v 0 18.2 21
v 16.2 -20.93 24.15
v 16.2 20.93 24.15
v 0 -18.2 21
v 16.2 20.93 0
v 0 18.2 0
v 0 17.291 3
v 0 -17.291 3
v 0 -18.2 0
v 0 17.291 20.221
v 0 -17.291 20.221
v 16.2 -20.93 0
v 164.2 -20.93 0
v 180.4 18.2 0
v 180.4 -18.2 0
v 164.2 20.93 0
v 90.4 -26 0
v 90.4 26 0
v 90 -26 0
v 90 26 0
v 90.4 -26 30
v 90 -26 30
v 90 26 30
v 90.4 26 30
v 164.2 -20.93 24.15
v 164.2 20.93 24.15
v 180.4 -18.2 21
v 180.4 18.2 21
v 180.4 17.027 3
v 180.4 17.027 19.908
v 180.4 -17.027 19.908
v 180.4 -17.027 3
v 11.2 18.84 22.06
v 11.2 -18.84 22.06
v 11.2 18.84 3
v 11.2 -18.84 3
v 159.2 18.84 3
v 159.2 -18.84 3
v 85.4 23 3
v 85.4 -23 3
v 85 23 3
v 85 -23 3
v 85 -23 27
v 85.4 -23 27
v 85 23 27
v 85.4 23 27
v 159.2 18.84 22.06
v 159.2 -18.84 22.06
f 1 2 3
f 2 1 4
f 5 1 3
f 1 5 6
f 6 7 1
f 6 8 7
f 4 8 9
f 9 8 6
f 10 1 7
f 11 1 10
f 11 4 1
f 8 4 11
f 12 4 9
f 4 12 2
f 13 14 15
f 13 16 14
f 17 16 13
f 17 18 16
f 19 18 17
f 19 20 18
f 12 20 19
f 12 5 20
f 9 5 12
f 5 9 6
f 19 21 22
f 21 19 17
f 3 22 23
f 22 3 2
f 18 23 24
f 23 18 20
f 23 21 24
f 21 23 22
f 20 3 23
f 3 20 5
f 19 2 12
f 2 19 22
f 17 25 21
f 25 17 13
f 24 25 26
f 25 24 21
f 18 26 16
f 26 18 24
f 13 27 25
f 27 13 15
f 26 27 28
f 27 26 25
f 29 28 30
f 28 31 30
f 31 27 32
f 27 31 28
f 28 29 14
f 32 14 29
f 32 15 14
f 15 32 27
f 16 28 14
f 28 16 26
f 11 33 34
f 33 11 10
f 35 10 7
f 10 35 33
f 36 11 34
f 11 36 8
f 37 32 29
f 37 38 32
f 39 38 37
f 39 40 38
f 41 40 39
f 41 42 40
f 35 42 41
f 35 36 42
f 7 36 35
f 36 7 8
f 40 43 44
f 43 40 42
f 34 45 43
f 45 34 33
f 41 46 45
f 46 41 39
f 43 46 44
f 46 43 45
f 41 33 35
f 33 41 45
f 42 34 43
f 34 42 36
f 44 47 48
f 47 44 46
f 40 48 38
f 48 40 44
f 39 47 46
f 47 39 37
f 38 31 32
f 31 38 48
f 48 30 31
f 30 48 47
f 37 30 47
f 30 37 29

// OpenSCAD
$fn = 32;

// ----------------------------------------------------------------------
// Faired channel: 180 x 52 x 30 mm, 3 mm walls, faired ends
// ----------------------------------------------------------------------

// --- parameters (mm) ---
length = 180;             // channel length
width = 52;               // channel width at mid length
height = 30;              // channel height at mid length
wall = 3;                 // side wall thickness
floor_t = 3;              // floor thickness
end_w = 36.4;             // faired end width
end_h = 21;               // faired end height

difference() {
  union() {
    hull() {
      translate([0, -18.2, 0]) cube([0.4, 36.4, 21]);
      translate([16.2, -20.93, 0]) cube([0.4, 41.86, 24.15]);
    }
    hull() {
      translate([16.2, -20.93, 0]) cube([0.4, 41.86, 24.15]);
      translate([90, -26, 0]) cube([0.4, 52, 30]);
    }
    hull() {
      translate([90, -26, 0]) cube([0.4, 52, 30]);
      translate([163.8, -20.93, 0]) cube([0.4, 41.86, 24.15]);
    }
    hull() {
      translate([163.8, -20.93, 0]) cube([0.4, 41.86, 24.15]);
      translate([180, -18.2, 0]) cube([0.4, 36.4, 21]);
    }
  }
  /* cavity, 5 mm proud of both ends so the ports are cut clean */
  hull() {
    translate([-5, -16.6, 3]) cube([0.4, 33.2, 16.4]);
    translate([11.2, -18.84, 3]) cube([0.4, 37.68, 19.06]);
  }
  hull() {
    translate([11.2, -18.84, 3]) cube([0.4, 37.68, 19.06]);
    translate([85, -23, 3]) cube([0.4, 46, 24]);
  }
  hull() {
    translate([85, -23, 3]) cube([0.4, 46, 24]);
    translate([158.8, -18.84, 3]) cube([0.4, 37.68, 19.06]);
  }
  hull() {
    translate([158.8, -18.84, 3]) cube([0.4, 37.68, 19.06]);
    translate([185, -16.6, 3]) cube([0.4, 33.2, 16.4]);
  }
}
